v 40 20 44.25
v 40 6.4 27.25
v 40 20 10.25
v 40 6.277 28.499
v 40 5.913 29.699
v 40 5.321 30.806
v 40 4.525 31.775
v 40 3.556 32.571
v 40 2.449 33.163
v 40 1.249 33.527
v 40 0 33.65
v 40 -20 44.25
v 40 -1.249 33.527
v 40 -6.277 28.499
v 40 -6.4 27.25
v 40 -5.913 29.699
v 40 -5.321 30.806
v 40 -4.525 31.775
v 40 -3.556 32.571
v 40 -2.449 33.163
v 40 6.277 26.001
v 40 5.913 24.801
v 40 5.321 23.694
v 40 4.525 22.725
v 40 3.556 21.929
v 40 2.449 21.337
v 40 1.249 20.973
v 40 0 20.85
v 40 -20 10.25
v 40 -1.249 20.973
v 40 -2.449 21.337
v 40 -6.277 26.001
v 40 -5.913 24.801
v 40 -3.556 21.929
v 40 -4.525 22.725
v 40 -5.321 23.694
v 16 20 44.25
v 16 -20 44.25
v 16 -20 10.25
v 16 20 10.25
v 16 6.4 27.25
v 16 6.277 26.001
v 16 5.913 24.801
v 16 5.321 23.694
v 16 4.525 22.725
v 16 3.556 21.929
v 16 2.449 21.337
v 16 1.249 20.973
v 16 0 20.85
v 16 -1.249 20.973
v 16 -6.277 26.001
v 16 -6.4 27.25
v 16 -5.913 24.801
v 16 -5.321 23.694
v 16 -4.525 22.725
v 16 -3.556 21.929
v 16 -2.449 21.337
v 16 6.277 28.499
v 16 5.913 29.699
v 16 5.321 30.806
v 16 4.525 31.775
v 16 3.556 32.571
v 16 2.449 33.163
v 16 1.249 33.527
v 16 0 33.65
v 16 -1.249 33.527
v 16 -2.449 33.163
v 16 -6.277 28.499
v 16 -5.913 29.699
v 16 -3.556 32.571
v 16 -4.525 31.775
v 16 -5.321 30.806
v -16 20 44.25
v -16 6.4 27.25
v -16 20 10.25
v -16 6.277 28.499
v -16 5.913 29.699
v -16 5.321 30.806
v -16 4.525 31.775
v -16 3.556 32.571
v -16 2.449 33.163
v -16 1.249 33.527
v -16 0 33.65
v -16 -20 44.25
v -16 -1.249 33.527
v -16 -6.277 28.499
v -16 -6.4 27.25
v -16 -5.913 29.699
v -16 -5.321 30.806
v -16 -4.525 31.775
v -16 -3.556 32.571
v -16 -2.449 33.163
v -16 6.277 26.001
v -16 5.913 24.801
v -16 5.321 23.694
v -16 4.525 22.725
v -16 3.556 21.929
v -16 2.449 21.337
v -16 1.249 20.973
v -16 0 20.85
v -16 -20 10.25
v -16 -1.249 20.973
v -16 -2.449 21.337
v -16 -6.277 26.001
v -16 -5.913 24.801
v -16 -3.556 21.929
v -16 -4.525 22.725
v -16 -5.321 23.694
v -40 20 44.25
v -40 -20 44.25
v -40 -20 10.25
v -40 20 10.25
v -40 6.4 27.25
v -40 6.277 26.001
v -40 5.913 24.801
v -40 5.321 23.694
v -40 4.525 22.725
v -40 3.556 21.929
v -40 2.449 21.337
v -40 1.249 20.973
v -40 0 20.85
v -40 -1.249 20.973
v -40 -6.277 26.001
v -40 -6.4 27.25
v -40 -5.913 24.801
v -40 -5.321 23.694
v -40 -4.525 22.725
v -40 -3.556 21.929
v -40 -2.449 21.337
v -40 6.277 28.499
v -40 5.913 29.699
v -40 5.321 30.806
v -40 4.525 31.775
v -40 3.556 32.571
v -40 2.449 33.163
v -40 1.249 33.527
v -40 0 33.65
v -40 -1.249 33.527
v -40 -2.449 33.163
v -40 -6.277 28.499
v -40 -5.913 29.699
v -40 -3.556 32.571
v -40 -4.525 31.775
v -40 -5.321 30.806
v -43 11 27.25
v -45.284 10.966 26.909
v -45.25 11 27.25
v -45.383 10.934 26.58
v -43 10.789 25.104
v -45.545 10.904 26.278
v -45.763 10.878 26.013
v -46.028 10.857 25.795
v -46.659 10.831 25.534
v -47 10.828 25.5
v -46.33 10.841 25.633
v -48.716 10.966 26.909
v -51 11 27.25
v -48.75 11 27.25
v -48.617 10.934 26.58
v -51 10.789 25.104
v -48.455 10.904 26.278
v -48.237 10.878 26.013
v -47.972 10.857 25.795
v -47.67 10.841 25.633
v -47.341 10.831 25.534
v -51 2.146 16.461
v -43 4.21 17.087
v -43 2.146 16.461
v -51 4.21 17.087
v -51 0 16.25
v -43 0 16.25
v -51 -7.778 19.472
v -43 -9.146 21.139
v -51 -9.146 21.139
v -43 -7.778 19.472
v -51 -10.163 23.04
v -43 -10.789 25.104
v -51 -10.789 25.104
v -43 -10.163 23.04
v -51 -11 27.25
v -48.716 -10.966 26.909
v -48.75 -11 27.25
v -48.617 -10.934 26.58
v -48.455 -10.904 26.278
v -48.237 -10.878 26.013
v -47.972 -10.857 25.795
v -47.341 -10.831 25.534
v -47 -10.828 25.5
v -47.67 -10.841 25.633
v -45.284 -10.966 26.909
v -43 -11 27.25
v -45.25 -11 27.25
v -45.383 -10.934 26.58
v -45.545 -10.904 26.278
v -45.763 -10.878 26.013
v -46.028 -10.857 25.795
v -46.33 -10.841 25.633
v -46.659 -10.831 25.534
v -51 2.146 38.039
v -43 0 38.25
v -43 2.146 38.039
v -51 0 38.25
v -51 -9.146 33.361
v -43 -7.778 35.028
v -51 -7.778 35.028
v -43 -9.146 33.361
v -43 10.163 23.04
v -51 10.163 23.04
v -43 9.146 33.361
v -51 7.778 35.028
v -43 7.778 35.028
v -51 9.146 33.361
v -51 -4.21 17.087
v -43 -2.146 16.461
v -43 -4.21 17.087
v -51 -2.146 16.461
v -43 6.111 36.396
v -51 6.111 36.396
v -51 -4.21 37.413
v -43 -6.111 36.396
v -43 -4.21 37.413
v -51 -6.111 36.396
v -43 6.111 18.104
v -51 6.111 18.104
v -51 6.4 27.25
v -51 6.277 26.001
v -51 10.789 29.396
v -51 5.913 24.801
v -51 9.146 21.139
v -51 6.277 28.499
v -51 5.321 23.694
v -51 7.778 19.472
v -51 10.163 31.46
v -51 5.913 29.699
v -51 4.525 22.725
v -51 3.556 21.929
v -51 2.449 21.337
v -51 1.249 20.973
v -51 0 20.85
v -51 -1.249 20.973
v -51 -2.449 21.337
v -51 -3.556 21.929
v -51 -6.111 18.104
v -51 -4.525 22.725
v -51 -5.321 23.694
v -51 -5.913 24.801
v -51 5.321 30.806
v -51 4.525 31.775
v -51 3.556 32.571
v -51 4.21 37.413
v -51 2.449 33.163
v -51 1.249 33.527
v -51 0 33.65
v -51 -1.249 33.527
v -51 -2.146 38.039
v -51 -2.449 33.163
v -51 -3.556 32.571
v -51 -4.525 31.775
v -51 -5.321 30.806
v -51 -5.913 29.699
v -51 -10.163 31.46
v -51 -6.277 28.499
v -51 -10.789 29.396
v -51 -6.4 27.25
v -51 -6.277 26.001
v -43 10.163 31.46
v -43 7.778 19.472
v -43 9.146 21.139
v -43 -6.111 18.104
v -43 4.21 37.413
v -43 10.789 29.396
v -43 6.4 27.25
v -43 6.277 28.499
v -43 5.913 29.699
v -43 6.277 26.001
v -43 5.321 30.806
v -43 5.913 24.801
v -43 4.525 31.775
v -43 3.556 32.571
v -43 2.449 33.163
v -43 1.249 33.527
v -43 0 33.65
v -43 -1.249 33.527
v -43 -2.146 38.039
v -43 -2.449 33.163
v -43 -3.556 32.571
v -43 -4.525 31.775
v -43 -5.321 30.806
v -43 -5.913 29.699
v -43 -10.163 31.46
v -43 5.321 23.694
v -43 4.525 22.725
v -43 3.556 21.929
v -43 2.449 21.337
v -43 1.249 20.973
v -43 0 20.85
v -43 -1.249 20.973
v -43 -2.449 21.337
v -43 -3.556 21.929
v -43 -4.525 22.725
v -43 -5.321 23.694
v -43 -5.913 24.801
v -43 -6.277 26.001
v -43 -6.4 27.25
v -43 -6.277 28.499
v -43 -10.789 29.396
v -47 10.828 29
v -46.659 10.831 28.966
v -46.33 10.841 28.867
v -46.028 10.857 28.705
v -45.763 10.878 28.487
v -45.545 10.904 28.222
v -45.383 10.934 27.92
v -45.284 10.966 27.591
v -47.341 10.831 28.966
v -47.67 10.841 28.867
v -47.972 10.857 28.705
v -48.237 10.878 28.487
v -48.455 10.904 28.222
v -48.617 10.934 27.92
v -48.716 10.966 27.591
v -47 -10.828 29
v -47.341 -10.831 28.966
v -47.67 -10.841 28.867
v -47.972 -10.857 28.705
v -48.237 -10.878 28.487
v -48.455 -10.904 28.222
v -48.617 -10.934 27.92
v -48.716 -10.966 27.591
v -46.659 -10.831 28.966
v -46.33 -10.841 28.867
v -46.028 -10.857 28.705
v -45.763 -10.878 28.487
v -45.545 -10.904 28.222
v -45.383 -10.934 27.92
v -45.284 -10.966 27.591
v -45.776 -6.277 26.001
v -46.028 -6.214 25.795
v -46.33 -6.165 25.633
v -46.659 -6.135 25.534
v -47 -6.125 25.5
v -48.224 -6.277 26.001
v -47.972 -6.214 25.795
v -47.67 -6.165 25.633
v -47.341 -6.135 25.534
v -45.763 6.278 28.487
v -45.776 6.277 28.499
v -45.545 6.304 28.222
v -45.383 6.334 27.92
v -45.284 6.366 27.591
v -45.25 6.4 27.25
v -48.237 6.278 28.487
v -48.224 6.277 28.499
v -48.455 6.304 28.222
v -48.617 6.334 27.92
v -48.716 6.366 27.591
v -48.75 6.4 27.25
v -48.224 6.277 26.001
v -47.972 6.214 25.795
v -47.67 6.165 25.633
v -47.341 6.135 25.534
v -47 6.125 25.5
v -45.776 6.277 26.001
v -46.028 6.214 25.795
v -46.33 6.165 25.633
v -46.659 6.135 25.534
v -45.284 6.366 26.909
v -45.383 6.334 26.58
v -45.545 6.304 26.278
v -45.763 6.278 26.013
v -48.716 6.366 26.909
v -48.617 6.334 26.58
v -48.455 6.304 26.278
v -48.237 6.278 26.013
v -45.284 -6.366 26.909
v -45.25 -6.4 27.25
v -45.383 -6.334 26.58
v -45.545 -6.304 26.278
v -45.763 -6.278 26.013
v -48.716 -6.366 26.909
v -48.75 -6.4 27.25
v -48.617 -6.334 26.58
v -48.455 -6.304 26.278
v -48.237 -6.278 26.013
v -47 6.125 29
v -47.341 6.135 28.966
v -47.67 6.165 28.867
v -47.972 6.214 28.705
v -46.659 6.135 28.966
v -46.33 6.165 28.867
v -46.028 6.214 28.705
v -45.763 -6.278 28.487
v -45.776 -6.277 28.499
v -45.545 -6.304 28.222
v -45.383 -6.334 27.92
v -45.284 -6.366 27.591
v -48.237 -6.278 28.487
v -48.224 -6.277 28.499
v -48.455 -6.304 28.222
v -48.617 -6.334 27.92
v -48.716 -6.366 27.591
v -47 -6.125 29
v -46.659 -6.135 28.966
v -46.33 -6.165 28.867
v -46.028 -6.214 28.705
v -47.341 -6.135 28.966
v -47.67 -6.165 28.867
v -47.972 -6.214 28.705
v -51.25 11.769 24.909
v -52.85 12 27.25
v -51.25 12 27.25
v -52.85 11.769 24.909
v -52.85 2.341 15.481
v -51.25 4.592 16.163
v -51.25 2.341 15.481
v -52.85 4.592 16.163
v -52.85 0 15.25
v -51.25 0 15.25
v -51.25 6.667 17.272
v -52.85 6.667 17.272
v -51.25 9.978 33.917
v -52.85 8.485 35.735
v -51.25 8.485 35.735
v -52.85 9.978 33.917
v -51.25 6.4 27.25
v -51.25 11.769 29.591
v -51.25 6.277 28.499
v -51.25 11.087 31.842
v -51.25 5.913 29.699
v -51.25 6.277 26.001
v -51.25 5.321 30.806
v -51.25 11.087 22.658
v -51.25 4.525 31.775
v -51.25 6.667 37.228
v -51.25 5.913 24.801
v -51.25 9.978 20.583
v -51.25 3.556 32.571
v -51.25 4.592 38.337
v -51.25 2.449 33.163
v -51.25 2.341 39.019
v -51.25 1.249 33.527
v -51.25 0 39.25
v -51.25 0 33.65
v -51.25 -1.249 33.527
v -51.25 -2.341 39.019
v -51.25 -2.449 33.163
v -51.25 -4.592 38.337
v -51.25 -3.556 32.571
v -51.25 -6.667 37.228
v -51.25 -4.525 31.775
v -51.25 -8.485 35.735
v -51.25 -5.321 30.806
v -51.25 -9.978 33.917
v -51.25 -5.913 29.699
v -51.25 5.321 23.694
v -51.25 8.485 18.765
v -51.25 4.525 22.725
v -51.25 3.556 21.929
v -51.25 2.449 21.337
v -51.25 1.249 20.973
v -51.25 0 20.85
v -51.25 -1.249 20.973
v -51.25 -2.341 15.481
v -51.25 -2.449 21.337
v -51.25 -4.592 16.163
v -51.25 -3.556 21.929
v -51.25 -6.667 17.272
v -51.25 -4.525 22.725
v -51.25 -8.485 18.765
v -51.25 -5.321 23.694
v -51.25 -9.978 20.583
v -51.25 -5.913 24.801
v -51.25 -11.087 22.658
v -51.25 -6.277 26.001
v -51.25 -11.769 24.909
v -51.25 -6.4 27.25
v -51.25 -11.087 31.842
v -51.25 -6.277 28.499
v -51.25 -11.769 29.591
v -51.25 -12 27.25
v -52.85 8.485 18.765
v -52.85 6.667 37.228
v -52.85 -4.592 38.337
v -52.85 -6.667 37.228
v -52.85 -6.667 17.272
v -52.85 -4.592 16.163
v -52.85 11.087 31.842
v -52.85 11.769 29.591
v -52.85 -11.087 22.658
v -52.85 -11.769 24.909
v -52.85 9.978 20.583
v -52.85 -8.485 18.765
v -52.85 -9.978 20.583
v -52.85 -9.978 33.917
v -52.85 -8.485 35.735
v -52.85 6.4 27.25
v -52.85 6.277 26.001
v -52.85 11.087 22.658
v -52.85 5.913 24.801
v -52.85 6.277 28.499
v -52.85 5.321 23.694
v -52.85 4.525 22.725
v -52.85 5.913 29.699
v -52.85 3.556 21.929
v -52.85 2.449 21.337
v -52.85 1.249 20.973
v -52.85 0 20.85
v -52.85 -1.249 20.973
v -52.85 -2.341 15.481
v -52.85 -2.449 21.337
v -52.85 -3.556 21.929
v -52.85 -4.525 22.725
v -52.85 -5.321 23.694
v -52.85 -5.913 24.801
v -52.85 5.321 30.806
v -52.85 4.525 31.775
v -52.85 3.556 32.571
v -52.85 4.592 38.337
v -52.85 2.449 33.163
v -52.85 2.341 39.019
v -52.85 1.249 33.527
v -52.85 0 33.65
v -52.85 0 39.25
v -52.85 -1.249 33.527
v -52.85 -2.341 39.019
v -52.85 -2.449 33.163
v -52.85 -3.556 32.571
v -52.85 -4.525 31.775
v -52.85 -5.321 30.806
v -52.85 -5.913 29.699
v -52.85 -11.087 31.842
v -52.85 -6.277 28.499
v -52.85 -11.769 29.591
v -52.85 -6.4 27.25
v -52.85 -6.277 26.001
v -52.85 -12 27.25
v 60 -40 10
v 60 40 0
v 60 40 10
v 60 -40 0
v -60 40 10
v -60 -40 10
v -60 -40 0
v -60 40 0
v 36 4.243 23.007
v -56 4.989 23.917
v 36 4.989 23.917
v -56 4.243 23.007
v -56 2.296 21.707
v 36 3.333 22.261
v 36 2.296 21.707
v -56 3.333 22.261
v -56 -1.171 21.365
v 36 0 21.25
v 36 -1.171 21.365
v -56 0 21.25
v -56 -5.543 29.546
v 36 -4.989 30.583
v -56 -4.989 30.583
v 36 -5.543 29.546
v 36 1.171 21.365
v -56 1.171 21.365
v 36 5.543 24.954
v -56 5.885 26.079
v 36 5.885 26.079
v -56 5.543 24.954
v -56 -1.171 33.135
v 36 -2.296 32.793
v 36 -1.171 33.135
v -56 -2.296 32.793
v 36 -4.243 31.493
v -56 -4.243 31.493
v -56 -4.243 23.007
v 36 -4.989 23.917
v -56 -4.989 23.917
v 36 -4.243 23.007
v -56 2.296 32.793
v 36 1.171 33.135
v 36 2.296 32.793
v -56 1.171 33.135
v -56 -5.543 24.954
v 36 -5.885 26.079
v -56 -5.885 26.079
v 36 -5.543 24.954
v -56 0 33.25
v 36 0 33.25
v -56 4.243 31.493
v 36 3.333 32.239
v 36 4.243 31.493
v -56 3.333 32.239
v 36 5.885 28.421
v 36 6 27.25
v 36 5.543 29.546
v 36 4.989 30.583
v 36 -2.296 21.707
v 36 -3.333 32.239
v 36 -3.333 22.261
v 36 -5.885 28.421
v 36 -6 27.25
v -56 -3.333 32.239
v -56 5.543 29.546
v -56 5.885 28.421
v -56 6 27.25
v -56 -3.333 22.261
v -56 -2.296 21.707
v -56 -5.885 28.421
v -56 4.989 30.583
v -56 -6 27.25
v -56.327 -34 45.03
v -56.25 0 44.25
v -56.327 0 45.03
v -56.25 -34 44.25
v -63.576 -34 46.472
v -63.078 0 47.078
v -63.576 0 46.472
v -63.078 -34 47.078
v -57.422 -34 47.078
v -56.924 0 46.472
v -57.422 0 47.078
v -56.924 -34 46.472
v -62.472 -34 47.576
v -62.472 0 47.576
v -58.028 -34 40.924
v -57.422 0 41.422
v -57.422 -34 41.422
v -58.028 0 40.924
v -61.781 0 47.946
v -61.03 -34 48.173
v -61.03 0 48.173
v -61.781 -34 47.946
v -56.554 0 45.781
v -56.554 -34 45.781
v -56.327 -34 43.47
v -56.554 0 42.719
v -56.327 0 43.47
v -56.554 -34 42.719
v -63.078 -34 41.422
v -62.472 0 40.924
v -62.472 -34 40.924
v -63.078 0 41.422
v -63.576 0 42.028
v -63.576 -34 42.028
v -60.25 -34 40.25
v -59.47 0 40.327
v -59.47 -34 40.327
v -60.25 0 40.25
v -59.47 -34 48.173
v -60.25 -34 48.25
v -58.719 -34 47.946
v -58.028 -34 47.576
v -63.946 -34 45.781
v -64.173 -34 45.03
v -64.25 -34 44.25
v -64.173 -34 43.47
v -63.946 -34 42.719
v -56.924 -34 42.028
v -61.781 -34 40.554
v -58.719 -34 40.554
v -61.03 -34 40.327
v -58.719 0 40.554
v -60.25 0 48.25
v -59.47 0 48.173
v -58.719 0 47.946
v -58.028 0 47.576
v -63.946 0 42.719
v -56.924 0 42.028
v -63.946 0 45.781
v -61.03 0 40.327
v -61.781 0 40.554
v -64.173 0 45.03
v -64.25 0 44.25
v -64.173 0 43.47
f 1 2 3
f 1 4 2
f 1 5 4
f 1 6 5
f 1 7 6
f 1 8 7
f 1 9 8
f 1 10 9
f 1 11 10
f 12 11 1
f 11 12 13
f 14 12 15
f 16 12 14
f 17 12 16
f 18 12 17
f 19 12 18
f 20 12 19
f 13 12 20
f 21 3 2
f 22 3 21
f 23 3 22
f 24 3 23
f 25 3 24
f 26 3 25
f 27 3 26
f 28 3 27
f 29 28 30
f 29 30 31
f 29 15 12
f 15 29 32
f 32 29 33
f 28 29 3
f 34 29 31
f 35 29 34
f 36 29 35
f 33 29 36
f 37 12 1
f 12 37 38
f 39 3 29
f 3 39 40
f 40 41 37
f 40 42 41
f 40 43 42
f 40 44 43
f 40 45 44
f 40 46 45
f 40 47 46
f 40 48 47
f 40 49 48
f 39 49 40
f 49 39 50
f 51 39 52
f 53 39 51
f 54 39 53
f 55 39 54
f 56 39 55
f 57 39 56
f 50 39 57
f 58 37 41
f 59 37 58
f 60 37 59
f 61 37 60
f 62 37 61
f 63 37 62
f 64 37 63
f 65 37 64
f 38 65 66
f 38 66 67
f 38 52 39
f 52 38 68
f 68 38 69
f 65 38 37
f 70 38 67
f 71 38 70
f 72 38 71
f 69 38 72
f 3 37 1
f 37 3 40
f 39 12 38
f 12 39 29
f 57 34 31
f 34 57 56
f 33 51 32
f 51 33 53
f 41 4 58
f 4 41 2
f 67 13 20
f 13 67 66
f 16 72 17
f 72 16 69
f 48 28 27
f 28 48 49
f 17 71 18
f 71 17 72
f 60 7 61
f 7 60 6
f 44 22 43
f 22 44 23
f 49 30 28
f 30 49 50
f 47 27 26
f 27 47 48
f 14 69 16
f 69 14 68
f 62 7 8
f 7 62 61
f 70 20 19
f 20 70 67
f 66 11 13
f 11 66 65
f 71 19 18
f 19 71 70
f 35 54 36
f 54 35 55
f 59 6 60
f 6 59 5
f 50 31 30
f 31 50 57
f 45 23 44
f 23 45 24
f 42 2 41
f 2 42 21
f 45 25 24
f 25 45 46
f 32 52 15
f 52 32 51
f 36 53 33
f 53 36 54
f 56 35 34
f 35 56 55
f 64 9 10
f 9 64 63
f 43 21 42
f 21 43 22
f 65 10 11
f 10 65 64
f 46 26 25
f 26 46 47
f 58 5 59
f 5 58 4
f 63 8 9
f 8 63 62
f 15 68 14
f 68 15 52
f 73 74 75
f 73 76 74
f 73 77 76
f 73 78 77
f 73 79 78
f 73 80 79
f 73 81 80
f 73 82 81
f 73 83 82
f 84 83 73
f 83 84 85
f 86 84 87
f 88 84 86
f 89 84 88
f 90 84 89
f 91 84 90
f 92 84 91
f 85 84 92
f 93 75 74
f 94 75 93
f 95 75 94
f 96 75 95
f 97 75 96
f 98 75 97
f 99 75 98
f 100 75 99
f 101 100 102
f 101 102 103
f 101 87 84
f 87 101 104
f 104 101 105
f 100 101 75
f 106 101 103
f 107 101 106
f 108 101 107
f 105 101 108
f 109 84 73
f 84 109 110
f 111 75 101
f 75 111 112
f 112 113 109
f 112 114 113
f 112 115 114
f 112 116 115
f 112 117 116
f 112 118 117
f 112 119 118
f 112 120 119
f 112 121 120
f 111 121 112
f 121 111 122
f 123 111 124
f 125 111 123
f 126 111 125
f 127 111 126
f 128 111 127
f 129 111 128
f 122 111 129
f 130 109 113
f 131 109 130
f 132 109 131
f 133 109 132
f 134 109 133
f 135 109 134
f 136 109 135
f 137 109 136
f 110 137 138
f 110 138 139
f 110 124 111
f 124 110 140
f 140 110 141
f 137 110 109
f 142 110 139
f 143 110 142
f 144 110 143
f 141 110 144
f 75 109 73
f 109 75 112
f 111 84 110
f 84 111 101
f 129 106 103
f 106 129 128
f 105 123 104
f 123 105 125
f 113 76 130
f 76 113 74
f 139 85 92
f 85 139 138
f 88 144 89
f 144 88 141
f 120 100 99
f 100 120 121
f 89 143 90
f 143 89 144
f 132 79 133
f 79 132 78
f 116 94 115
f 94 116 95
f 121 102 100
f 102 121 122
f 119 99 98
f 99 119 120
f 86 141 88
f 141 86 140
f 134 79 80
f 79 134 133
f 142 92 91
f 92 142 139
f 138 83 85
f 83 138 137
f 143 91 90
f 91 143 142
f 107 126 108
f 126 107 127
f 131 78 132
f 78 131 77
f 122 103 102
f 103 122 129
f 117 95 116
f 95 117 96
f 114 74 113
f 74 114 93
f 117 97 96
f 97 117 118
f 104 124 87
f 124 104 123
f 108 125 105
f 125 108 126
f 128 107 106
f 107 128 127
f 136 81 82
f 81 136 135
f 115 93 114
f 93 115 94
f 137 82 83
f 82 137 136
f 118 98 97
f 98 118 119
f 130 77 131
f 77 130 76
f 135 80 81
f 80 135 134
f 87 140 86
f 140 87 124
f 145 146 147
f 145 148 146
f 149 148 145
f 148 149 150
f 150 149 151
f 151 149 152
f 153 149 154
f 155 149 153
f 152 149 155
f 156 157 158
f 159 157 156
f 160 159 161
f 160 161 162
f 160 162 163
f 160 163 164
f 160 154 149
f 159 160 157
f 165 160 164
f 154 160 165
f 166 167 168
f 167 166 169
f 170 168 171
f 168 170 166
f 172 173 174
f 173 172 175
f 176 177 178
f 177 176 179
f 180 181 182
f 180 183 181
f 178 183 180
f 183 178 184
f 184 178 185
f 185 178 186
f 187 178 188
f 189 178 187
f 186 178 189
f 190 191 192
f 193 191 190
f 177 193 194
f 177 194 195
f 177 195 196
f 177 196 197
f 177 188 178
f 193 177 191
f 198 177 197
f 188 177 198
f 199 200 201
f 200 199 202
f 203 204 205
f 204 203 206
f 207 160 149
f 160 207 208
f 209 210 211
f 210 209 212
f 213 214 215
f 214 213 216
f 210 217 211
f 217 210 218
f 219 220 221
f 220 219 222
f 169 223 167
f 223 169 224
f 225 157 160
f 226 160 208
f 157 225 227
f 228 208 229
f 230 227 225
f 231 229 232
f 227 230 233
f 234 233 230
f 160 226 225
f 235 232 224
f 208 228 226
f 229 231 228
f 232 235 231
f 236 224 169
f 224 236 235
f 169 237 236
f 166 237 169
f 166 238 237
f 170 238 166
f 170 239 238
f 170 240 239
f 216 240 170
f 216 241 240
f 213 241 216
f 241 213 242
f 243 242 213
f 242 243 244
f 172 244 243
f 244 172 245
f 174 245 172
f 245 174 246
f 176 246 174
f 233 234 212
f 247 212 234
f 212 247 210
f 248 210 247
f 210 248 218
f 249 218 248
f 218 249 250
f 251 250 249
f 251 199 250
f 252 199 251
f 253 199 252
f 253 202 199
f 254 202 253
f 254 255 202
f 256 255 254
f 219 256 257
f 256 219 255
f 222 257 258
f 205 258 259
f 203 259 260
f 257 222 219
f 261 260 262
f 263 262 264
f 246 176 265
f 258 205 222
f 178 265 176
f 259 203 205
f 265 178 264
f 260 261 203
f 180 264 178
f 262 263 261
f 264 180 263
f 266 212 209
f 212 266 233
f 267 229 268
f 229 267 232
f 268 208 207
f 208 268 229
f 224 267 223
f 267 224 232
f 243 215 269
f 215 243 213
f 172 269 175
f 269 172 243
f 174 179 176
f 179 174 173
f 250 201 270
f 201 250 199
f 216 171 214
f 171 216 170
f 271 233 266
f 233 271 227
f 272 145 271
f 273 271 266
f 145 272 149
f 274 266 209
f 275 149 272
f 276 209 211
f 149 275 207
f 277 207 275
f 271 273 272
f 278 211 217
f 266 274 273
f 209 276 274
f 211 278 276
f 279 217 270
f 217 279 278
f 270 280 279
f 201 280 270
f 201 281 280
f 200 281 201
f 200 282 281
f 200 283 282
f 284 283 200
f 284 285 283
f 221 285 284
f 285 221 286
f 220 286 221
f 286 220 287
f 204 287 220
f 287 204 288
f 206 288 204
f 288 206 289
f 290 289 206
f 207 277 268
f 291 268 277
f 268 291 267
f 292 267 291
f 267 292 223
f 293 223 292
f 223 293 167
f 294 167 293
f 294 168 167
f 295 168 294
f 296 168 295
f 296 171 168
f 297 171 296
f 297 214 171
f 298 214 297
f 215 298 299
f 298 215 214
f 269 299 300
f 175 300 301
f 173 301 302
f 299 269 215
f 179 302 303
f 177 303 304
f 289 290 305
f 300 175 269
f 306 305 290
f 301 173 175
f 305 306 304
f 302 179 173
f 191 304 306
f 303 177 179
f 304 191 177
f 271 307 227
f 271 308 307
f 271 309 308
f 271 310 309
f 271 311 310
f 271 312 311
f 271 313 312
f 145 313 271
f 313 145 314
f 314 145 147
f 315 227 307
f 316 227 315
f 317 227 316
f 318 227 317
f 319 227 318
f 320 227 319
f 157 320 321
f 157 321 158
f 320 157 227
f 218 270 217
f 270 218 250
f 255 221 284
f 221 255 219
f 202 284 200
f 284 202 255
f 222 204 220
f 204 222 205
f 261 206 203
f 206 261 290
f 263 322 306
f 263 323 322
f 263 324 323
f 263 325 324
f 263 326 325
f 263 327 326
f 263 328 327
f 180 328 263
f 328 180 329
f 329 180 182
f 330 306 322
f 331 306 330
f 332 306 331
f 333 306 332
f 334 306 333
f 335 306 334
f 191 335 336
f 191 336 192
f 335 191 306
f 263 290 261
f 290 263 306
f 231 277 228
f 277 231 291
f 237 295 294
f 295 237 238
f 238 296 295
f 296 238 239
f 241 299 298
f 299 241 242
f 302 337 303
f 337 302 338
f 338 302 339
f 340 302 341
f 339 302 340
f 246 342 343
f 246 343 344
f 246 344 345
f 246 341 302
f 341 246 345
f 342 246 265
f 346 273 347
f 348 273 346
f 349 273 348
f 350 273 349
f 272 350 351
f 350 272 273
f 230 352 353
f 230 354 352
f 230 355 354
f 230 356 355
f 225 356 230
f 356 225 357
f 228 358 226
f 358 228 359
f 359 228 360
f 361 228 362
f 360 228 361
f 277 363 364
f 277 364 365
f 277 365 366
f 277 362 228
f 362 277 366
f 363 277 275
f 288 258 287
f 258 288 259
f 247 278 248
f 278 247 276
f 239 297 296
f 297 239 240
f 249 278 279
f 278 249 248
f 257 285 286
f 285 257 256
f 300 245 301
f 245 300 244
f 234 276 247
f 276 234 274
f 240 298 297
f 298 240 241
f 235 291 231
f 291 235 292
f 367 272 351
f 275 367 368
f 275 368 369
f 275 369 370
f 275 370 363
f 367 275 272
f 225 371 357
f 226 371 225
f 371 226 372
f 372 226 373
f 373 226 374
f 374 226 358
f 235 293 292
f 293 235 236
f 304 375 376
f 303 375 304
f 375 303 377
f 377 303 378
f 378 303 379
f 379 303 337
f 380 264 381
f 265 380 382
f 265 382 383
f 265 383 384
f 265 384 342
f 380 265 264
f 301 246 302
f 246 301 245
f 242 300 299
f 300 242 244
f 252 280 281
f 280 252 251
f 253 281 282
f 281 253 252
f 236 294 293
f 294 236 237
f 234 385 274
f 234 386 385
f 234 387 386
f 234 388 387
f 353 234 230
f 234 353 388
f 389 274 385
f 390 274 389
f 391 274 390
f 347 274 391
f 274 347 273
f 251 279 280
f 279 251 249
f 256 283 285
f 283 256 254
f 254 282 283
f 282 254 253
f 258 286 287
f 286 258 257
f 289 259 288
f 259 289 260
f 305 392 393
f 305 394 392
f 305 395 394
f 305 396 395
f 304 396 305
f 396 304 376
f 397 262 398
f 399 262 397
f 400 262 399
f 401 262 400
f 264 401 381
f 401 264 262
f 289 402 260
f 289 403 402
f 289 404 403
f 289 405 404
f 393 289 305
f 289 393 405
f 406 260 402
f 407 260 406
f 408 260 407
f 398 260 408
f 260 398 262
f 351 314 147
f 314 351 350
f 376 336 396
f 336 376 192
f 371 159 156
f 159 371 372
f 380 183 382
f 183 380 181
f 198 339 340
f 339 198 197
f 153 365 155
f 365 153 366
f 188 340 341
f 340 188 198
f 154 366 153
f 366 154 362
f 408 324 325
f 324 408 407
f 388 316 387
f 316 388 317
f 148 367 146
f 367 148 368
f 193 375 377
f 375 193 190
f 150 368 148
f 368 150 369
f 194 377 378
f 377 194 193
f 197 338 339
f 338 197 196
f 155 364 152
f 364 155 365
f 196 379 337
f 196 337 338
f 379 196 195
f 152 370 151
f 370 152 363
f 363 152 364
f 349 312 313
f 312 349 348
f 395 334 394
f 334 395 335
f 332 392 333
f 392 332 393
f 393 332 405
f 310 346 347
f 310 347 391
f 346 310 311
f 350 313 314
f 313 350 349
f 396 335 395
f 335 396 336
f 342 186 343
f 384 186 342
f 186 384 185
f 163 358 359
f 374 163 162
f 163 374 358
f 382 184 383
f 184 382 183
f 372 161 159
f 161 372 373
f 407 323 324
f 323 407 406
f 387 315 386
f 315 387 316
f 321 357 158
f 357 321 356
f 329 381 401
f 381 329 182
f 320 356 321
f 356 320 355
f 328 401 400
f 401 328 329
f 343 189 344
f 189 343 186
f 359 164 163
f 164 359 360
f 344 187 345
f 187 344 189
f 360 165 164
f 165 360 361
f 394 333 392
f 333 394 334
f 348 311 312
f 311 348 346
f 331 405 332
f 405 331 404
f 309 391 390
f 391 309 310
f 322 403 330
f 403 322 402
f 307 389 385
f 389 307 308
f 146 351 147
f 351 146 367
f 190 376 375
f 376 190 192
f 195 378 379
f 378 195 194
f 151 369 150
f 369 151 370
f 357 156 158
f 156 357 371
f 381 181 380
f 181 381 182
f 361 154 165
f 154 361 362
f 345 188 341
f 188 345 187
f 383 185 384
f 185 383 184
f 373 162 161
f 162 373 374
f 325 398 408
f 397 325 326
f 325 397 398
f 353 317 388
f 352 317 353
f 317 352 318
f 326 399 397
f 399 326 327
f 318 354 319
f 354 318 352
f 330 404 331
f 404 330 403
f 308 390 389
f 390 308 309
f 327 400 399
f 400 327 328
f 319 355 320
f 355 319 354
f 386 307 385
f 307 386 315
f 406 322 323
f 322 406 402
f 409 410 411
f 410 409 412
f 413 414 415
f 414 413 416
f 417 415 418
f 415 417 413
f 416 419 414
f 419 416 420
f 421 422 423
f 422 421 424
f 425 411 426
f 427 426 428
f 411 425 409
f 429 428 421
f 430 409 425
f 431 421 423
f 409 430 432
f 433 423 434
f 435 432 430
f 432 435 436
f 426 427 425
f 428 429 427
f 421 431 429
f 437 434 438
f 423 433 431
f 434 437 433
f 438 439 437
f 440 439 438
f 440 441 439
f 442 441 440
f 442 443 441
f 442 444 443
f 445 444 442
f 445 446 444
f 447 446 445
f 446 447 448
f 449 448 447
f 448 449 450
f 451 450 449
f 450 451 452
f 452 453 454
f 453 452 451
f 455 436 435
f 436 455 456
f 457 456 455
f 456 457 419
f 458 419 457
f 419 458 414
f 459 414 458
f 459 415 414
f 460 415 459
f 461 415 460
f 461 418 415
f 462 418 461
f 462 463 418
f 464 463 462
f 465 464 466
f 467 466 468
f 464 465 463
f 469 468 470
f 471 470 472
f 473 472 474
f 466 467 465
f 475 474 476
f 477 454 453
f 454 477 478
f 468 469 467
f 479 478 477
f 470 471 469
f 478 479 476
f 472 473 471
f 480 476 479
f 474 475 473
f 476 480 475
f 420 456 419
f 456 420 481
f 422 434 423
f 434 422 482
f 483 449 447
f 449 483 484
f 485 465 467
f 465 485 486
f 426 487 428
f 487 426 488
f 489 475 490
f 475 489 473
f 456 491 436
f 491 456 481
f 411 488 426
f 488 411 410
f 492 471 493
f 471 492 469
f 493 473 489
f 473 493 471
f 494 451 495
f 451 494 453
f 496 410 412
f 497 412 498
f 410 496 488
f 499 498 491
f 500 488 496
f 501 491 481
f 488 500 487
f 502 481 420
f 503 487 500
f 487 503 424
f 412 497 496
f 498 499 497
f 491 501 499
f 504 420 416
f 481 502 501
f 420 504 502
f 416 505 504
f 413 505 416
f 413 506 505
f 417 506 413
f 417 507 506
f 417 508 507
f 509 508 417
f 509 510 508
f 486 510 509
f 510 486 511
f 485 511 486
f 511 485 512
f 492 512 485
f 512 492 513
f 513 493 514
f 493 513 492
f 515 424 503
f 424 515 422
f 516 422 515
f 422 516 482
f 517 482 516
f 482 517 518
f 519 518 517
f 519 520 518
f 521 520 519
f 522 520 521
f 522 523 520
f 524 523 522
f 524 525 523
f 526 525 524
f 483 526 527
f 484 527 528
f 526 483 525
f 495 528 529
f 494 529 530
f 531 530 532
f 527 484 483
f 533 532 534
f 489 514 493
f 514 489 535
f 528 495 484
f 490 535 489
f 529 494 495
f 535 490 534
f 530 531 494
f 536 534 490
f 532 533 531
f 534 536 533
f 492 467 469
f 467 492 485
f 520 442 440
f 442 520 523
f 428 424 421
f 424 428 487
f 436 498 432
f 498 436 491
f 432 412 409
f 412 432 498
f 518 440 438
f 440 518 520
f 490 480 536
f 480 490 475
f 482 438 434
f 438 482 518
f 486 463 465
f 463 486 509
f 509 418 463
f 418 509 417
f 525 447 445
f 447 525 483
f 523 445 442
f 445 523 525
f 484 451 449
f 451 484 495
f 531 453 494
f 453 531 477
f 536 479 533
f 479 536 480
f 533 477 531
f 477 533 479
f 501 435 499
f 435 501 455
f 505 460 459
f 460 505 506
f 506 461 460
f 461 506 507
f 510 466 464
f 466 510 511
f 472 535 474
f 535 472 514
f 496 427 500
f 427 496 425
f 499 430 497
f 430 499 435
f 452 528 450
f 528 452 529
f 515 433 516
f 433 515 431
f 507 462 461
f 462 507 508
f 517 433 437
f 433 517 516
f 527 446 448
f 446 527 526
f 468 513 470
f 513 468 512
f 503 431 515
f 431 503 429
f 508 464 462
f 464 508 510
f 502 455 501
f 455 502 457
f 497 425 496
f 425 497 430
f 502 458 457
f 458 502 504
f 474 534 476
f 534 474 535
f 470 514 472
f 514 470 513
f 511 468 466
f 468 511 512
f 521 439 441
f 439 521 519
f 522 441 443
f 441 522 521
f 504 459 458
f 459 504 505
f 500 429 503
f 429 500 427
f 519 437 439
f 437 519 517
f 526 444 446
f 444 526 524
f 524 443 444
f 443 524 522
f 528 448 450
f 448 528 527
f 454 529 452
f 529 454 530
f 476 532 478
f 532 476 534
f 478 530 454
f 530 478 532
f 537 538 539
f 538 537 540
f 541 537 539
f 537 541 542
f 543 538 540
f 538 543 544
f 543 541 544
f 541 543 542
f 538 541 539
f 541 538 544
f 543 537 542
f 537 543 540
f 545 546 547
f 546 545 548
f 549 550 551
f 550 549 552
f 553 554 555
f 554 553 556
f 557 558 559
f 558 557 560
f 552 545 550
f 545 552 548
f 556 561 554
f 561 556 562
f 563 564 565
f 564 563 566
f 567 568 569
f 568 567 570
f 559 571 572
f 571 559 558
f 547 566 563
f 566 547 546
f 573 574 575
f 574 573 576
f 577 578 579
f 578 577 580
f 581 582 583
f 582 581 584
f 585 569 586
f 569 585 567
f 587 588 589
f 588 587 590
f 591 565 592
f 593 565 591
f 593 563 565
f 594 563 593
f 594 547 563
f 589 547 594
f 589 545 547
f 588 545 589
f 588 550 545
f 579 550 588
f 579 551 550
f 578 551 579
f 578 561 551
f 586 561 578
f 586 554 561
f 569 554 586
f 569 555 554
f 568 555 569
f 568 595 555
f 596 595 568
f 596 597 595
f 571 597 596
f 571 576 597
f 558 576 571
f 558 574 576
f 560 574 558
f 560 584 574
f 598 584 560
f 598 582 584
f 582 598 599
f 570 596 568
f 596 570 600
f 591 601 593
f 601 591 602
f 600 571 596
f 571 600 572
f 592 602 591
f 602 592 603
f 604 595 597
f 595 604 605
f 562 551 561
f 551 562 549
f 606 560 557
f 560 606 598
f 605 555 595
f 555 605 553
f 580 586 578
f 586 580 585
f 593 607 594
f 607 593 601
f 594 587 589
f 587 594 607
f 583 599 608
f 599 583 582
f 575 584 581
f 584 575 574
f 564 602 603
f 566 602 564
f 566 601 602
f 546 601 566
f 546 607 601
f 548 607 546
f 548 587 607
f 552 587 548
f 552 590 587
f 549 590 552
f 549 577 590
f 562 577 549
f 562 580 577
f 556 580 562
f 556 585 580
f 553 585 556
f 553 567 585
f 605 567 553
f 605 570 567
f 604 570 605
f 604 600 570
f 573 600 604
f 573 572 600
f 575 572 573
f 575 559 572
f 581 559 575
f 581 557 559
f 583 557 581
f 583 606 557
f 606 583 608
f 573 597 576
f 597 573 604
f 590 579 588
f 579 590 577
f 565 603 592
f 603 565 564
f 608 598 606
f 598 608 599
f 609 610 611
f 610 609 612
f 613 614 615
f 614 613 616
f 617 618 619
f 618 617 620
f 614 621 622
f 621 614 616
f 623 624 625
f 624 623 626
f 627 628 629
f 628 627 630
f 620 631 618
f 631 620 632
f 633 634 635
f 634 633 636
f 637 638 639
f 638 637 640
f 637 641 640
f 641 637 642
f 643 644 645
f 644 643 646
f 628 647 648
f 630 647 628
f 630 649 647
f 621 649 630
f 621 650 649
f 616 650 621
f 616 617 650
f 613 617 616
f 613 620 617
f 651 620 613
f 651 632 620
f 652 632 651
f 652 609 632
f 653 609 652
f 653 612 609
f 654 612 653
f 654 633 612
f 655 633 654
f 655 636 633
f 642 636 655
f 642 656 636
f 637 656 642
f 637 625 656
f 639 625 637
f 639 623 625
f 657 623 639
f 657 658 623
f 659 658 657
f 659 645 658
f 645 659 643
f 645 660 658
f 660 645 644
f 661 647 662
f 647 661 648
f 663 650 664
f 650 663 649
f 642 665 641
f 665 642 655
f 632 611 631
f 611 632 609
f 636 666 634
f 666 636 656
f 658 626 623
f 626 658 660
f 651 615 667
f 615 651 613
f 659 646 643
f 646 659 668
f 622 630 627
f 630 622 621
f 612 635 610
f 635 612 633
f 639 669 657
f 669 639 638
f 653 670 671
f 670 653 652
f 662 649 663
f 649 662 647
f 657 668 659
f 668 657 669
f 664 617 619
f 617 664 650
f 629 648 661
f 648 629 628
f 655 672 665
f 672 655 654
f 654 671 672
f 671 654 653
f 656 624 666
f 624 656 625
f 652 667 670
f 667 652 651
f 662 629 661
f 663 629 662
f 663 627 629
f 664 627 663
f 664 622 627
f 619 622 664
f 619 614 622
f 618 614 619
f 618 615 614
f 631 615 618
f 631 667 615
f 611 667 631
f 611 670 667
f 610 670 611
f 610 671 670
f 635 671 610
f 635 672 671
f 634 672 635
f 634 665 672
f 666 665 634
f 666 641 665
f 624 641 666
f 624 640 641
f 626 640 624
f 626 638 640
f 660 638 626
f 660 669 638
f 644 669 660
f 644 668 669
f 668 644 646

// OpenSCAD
$fn = 32;

// ------------------------------------------------------------------------
// Machine vise: screw d12, jaws 24 x 34 mm
// Every part is its own module, assembly() places every instance.
// ------------------------------------------------------------------------

// --- part 1 ---
module vise_bed() {
  difference() {
    translate([-60, -40, 0]) cube([120, 80, 10]);
  }
}

// --- part 2 ---
module vise_jaw() {
  difference() {
    translate([-12, -20, 0]) cube([24, 40, 34]);
    translate([0, 0, 17]) rotate([0, 90, 0]) cylinder(h = 26, d = 12.8, center = true);
  }
}

// --- part 3 ---
module vise_screw() {
  translate([0, 0, -46]) cylinder(h = 92, d = 12);
}

// --- part 4 ---
module screw_collar() {
  difference() {
    cylinder(h = 8, d = 22);
    translate([0, 0, -1]) cylinder(h = 10, d = 12.8);
    translate([0, 0, 4]) rotate([90, 0, 0]) cylinder(h = 24, d = 3.5, center = true);
  }
}

// --- part 5 ---
module screw_washer() {
  difference() {
      translate([0, 0, 0]) cylinder(h = 1.6, d = 24);
      translate([0, 0, -1]) cylinder(h = 3.6, d = 12.8);
    }
}

// --- part 6 ---
module vise_handle() {
  cylinder(h = 34, d = 8);
}

// --- assembly ---
module assembly() {
  color([0.80, 0.24, 0.20]) translate([0, 0, 0]) rotate([0, 0, 0]) vise_bed();
  color([0.20, 0.45, 0.75]) translate([28, 0, 10.25]) rotate([0, 0, 0]) vise_jaw();
  color([0.25, 0.62, 0.32]) translate([-28, 0, 10.25]) rotate([0, 0, 0]) vise_jaw();
  color([0.92, 0.70, 0.18]) translate([-10, 0, 27.25]) rotate([0, 90, 0]) vise_screw();
  color([0.58, 0.35, 0.70]) translate([-51, 0, 27.25]) rotate([0, 90, 0]) screw_collar();
  color([0.16, 0.66, 0.66]) translate([-52.85, 0, 27.25]) rotate([0, 90, 0]) screw_washer();
  color([0.85, 0.48, 0.18]) translate([-60.25, 0, 44.25]) rotate([90, 0, 0]) vise_handle();
}

assembly();
